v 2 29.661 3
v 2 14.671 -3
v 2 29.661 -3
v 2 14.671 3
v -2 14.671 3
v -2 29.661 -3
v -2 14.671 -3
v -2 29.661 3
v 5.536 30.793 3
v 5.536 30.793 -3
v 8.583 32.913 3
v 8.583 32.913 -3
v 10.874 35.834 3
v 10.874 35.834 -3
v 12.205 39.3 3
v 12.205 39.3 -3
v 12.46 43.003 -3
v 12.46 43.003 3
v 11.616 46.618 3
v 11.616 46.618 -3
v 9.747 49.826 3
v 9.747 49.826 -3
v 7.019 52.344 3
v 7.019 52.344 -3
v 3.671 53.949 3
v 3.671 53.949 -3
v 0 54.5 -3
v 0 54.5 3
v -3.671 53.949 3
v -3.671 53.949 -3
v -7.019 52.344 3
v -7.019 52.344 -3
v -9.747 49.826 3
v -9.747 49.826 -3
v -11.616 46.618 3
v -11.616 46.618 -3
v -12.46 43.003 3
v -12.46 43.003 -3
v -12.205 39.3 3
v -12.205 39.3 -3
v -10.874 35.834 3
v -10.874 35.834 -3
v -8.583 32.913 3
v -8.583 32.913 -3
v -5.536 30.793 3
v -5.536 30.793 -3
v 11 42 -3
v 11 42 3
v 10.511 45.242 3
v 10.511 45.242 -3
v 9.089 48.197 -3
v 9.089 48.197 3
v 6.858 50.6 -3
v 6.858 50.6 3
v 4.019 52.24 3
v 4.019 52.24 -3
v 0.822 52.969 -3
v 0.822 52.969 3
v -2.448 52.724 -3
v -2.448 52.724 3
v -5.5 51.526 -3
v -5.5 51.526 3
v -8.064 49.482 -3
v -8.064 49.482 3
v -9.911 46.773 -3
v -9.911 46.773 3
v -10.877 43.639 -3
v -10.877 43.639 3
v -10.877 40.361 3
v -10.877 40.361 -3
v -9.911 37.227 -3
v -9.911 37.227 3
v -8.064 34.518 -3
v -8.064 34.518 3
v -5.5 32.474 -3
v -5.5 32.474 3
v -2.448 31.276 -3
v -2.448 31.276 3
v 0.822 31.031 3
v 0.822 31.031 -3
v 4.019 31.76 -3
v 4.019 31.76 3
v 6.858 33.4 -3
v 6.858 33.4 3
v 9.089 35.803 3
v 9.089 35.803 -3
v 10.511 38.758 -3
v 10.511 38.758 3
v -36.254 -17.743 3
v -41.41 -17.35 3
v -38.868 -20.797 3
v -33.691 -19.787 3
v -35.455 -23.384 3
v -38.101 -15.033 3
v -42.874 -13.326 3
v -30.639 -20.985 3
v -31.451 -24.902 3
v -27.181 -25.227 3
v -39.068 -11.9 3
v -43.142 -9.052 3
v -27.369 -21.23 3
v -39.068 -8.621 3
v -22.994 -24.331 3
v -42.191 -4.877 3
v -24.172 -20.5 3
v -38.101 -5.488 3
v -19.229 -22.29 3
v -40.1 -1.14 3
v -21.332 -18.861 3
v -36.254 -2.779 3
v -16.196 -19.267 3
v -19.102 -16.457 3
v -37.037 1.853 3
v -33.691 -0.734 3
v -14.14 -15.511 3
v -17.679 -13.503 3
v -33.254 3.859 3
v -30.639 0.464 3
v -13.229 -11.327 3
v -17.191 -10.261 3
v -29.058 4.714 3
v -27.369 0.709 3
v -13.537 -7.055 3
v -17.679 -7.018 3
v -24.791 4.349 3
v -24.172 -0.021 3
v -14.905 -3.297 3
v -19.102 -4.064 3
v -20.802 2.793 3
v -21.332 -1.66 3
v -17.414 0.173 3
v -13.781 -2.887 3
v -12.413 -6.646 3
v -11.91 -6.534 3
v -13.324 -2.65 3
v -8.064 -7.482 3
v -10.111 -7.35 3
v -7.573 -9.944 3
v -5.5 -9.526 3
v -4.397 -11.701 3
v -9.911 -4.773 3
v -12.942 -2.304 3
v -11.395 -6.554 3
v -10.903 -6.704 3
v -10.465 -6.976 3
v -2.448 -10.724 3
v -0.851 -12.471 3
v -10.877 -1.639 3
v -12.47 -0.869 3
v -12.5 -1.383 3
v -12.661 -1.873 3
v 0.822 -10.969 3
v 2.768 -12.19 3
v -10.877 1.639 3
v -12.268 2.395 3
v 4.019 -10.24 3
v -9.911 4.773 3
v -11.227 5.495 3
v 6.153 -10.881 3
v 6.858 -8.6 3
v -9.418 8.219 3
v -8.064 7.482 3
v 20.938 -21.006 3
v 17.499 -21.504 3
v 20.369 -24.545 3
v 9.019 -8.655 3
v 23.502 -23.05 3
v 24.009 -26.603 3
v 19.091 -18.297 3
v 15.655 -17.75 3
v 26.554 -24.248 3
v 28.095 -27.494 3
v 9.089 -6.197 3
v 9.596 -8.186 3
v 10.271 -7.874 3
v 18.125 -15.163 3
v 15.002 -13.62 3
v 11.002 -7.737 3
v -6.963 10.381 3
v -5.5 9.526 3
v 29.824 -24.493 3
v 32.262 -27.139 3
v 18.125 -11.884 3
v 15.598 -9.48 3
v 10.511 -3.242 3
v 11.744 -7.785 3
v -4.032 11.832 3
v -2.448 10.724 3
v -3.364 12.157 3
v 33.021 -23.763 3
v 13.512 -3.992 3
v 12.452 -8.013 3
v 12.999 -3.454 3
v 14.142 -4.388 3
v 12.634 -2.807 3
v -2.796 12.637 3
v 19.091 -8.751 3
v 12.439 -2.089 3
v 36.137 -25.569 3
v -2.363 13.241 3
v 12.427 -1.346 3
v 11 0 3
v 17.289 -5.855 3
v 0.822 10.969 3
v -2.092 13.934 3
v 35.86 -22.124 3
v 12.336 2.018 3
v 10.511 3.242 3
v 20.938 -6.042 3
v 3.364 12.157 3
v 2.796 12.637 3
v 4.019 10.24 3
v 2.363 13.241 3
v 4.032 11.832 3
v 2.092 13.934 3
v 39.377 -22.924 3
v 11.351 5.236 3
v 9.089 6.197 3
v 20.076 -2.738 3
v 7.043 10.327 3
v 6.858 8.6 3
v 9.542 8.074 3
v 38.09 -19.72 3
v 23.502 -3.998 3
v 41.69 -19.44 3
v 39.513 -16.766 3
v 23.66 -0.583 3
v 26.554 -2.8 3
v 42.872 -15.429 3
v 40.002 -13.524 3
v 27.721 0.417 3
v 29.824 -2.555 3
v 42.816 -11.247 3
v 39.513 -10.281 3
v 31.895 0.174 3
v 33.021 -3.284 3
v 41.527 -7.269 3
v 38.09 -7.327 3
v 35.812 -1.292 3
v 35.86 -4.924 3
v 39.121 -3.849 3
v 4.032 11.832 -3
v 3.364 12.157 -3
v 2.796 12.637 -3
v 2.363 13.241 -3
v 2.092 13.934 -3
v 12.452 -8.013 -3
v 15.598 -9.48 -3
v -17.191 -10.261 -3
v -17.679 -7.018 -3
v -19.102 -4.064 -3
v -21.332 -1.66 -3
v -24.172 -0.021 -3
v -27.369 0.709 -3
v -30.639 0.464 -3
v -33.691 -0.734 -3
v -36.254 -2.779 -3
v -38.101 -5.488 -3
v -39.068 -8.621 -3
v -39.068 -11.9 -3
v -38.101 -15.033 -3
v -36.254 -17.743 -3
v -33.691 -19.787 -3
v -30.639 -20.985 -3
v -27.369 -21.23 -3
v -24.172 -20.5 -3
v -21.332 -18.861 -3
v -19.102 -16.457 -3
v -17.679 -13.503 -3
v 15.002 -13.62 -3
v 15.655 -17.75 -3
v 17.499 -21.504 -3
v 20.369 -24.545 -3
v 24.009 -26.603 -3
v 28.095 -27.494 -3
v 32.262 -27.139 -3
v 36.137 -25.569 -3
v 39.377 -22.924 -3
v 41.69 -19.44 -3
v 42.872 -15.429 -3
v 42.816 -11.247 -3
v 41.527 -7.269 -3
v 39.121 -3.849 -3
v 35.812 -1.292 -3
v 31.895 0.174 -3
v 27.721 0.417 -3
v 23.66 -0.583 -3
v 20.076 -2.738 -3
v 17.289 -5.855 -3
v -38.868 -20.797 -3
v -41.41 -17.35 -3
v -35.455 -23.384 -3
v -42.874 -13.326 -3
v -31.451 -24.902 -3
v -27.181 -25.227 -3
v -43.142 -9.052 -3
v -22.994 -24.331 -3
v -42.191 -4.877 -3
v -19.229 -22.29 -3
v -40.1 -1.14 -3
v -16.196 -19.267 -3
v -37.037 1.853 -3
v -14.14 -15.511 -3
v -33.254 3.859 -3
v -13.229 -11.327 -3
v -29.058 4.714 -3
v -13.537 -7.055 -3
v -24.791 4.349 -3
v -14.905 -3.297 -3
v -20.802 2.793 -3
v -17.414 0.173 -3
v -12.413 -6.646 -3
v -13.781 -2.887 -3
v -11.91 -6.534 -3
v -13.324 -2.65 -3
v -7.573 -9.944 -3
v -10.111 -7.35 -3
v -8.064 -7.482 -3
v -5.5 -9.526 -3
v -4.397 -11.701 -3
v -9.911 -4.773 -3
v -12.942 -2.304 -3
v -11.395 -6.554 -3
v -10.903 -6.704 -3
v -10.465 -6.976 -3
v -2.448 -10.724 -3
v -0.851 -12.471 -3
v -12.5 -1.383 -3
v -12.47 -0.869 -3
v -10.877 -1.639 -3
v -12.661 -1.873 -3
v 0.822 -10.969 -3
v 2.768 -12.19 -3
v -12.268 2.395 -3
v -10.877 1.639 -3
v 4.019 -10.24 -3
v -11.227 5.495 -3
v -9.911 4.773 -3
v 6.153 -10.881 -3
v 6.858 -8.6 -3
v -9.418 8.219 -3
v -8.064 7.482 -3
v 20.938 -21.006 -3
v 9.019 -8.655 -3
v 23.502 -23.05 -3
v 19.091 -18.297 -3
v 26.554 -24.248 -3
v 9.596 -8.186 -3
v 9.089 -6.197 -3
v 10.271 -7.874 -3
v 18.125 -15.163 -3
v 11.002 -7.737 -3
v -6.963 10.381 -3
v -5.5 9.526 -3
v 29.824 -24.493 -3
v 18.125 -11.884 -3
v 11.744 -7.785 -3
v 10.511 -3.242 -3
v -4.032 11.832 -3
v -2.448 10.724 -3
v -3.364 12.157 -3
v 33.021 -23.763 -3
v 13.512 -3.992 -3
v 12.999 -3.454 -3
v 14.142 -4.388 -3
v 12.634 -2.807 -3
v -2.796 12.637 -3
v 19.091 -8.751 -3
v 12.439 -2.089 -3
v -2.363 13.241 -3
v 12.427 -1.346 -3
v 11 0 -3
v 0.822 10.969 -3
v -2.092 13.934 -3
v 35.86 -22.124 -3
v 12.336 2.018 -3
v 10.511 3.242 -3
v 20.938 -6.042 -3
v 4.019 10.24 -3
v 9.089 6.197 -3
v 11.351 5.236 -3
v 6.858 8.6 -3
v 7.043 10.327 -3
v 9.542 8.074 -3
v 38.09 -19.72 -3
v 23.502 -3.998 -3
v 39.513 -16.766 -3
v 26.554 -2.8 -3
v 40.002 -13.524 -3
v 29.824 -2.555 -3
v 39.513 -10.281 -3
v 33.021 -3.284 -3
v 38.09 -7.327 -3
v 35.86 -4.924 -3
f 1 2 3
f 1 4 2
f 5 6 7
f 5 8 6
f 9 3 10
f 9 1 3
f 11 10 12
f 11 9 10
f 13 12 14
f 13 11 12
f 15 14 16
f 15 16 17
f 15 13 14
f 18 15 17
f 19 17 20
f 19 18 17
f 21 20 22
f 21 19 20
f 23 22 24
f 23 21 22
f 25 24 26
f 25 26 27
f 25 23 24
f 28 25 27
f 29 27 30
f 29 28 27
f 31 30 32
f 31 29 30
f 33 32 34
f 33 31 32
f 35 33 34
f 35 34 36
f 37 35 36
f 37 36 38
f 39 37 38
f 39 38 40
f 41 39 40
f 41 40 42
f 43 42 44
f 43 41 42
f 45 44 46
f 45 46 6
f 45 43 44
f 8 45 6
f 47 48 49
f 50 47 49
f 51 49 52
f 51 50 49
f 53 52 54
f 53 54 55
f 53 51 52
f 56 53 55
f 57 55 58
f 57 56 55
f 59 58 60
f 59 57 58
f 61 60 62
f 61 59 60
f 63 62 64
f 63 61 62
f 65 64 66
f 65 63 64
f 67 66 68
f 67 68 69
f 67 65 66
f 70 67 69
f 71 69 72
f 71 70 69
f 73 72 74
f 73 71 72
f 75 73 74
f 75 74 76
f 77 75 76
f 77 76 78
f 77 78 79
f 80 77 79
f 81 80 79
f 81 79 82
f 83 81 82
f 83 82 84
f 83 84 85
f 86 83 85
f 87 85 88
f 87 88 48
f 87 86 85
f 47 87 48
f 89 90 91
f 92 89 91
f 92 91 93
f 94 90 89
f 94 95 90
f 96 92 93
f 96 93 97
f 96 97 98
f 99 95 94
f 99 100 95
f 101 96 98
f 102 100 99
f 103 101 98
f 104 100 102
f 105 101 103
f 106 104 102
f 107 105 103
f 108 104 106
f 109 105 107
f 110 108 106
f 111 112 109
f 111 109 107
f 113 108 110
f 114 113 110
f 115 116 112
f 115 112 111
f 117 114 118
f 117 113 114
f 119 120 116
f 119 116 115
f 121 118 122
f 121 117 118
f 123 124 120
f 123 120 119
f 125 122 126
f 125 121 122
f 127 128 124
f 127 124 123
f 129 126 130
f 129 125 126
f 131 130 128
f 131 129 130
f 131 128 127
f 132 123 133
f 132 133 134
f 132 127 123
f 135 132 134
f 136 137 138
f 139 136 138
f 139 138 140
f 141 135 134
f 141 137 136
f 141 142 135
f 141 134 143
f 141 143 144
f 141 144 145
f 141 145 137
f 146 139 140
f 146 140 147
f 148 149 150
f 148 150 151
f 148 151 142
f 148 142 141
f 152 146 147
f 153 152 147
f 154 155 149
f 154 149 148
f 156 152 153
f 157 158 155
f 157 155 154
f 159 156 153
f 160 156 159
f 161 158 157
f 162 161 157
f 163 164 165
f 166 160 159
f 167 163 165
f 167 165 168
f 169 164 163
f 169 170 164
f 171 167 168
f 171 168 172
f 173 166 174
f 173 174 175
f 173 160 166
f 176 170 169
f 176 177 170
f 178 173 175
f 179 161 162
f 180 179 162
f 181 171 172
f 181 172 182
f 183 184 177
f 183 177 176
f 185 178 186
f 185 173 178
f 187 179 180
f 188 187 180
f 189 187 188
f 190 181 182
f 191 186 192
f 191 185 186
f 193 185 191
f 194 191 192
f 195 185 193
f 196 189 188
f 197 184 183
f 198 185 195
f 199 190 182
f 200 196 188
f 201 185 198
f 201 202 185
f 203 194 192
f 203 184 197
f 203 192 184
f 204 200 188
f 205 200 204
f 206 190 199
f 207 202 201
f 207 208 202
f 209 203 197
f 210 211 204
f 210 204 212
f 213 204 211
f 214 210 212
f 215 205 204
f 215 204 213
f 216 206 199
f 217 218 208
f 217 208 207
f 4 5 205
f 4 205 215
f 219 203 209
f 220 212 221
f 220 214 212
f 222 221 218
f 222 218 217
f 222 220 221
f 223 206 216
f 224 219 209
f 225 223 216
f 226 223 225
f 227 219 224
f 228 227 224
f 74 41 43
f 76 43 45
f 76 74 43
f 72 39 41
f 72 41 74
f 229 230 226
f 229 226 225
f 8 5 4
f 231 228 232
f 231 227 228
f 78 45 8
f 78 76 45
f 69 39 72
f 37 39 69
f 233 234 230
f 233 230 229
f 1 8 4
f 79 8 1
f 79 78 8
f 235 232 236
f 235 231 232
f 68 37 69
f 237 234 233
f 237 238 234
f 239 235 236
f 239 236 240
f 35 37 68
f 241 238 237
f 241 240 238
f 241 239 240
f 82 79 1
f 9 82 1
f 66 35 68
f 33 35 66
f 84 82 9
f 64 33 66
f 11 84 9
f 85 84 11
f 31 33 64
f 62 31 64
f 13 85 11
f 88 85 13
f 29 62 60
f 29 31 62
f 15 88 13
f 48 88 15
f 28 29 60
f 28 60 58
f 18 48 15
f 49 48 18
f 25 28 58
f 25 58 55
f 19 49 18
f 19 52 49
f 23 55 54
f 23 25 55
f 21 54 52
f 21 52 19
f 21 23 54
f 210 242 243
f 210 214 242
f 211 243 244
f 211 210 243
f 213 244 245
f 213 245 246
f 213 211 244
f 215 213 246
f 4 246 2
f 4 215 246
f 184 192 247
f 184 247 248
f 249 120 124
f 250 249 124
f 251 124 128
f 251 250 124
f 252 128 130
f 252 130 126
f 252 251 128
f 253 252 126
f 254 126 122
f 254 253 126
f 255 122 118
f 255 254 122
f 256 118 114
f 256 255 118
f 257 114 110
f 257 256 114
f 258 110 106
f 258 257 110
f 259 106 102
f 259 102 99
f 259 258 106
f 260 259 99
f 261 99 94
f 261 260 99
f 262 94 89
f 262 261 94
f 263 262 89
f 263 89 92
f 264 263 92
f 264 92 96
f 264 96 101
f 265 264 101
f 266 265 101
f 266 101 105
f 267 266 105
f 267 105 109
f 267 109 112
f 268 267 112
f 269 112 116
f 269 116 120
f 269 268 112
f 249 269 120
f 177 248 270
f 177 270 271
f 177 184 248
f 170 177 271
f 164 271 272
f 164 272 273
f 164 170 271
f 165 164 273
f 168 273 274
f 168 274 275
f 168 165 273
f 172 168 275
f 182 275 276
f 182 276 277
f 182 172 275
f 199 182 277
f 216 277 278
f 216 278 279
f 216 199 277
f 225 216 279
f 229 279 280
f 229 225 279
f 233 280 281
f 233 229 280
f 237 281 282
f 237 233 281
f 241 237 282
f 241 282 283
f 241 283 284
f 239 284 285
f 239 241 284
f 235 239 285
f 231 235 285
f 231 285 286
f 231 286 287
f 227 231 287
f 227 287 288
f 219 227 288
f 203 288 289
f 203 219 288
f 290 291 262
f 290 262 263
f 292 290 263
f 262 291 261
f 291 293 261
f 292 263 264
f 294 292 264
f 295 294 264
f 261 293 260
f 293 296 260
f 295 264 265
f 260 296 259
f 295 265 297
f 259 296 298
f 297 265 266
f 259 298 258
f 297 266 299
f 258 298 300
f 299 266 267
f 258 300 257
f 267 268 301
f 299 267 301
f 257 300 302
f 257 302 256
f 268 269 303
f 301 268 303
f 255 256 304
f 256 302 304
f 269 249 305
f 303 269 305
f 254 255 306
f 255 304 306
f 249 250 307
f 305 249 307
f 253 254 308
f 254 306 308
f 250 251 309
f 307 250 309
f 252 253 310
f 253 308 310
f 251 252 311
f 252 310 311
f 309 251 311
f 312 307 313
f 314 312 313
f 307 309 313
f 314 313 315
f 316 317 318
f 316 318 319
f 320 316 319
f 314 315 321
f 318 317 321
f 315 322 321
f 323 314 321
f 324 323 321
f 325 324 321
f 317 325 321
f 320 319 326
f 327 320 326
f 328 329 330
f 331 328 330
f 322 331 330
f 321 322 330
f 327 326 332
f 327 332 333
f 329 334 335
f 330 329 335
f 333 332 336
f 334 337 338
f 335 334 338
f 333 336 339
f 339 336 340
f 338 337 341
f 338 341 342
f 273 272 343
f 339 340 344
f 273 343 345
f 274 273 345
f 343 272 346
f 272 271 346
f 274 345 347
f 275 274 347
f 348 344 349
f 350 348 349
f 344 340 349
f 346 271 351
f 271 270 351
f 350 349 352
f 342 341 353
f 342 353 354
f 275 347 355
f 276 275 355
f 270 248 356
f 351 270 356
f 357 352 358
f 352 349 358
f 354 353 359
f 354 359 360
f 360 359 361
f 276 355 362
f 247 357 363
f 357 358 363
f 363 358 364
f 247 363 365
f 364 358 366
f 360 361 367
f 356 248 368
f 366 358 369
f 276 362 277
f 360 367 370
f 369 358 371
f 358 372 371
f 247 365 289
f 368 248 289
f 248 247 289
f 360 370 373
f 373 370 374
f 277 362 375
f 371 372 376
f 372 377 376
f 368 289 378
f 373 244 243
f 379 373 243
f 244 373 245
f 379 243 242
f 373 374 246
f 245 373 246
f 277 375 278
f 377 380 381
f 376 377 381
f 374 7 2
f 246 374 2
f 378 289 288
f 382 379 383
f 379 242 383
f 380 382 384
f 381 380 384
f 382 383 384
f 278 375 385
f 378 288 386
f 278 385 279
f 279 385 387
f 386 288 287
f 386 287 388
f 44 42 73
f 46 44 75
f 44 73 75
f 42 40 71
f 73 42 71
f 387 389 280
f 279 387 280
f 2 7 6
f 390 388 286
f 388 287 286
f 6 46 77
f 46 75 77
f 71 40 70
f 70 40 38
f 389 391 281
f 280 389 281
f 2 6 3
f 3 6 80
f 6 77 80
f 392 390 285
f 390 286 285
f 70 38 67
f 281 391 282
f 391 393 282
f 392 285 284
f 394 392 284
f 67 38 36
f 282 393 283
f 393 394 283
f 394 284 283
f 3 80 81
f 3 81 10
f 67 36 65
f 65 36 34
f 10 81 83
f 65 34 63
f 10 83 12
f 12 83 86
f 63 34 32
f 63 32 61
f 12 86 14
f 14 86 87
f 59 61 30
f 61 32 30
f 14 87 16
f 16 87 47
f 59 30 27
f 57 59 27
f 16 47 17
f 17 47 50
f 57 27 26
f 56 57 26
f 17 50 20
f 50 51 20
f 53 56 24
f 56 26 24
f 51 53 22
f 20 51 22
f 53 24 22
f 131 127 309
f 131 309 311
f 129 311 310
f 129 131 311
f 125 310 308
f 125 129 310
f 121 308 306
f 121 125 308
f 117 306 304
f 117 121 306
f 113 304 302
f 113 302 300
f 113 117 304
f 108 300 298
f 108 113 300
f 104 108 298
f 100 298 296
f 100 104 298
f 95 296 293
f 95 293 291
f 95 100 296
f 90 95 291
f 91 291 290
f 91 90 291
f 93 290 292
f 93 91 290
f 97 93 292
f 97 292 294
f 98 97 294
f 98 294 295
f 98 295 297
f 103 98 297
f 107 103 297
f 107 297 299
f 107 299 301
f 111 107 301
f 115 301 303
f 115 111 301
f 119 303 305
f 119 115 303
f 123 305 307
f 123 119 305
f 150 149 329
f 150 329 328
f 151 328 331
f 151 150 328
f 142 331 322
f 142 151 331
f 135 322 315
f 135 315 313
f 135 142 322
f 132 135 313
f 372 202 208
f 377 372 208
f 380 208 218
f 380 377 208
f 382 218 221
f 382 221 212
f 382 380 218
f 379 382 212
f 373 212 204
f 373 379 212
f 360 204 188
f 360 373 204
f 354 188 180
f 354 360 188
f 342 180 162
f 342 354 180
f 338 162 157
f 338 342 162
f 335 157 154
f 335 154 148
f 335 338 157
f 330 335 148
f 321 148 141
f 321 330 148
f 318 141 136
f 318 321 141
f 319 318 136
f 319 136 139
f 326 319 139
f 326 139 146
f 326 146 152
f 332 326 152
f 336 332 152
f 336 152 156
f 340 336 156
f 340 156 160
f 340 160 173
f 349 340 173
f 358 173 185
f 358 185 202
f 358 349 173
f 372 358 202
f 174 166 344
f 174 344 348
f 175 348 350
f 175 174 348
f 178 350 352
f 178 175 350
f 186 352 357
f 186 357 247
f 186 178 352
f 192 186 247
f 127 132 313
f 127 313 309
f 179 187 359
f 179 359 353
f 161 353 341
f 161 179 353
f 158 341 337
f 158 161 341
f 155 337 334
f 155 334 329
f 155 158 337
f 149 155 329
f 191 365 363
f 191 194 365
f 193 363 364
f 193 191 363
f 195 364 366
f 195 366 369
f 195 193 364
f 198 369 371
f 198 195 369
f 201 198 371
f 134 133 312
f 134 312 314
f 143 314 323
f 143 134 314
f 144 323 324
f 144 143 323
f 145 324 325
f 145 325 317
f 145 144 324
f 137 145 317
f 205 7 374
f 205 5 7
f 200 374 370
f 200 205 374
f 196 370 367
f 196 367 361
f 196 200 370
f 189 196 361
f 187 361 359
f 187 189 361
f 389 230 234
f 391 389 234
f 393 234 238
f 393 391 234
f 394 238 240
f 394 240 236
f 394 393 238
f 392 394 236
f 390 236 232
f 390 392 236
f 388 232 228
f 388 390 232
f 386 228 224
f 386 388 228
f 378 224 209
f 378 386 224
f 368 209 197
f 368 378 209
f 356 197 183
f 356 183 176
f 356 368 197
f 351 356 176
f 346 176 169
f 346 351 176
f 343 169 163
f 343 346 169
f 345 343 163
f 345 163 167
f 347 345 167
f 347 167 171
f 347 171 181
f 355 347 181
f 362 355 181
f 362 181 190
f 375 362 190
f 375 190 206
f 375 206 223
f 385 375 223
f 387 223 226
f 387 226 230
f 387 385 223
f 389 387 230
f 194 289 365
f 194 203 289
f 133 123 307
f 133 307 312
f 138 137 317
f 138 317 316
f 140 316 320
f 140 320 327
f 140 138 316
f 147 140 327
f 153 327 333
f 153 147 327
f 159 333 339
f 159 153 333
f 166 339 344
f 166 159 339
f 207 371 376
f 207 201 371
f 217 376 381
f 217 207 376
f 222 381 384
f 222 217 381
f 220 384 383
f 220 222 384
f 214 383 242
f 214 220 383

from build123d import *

# Parameters (mm, degrees)
F0_R     = 11
F1_DEPTH = 3


with BuildPart() as f1:
    # F0 (on Top) → F1 (new body, symmetric)
    with BuildSketch(Plane.XY):
        with BuildLine():
            ThreePointArc((-2, 14.671401), (-2.560407, 12.925438), (-4.032258, 11.831775))
            ThreePointArc((-4.032258, 11.831775), (-10.411858, 6.916879), (-12.469754, -0.869041))
            ThreePointArc((-12.469754, -0.869041), (-12.787701, -2.097561), (-13.780875, -2.887473))
            Line((-13.780875, -2.887473), (-14.905284, -3.296724))
            ThreePointArc((-14.905284, -3.296724), (-42.286168, -15.390906), (-13.537203, -7.055495))
            Line((-13.537203, -7.055495), (-12.412794, -6.646243))
            ThreePointArc((-12.412794, -6.646243), (-11.144234, -6.61295), (-10.110995, -7.34968))
            ThreePointArc((-10.110995, -7.34968), (-0.850808, -12.471011), (9.019124, -8.654791))
            ThreePointArc((9.019124, -8.654791), (10.63235, -7.783043), (12.451568, -8.013017))
            Line((12.451568, -8.013017), (15.598444, -9.48043))
            ThreePointArc((15.598444, -9.48043), (41.690158, -19.44044), (17.288917, -5.855198))
            Line((17.288917, -5.855198), (14.142041, -4.387786))
            ThreePointArc((14.142041, -4.387786), (12.7965, -3.142009), (12.427336, -1.345857))
            ThreePointArc((12.427336, -1.345857), (10.542393, 6.716245), (4.032258, 11.831775))
            ThreePointArc((4.032258, 11.831775), (2.560407, 12.925438), (2, 14.671401))
            Line((2, 14.671401), (2, 29.661037))
            ThreePointArc((2, 29.661037), (0, 54.5), (-2, 29.661037))
            Line((-2, 29.661037), (-2, 14.671401))
        make_face()
        with Locations((-28.190779, -10.260604)):
            Circle(F0_R, mode=Mode.SUBTRACT)
        with Locations((29.001849, -13.523784)):
            Circle(F0_R, mode=Mode.SUBTRACT)
        Circle(F0_R, mode=Mode.SUBTRACT)
        with Locations((0, 42)):
            Circle(F0_R, mode=Mode.SUBTRACT)
    extrude(amount=F1_DEPTH, both=True)


solid = f1.part
